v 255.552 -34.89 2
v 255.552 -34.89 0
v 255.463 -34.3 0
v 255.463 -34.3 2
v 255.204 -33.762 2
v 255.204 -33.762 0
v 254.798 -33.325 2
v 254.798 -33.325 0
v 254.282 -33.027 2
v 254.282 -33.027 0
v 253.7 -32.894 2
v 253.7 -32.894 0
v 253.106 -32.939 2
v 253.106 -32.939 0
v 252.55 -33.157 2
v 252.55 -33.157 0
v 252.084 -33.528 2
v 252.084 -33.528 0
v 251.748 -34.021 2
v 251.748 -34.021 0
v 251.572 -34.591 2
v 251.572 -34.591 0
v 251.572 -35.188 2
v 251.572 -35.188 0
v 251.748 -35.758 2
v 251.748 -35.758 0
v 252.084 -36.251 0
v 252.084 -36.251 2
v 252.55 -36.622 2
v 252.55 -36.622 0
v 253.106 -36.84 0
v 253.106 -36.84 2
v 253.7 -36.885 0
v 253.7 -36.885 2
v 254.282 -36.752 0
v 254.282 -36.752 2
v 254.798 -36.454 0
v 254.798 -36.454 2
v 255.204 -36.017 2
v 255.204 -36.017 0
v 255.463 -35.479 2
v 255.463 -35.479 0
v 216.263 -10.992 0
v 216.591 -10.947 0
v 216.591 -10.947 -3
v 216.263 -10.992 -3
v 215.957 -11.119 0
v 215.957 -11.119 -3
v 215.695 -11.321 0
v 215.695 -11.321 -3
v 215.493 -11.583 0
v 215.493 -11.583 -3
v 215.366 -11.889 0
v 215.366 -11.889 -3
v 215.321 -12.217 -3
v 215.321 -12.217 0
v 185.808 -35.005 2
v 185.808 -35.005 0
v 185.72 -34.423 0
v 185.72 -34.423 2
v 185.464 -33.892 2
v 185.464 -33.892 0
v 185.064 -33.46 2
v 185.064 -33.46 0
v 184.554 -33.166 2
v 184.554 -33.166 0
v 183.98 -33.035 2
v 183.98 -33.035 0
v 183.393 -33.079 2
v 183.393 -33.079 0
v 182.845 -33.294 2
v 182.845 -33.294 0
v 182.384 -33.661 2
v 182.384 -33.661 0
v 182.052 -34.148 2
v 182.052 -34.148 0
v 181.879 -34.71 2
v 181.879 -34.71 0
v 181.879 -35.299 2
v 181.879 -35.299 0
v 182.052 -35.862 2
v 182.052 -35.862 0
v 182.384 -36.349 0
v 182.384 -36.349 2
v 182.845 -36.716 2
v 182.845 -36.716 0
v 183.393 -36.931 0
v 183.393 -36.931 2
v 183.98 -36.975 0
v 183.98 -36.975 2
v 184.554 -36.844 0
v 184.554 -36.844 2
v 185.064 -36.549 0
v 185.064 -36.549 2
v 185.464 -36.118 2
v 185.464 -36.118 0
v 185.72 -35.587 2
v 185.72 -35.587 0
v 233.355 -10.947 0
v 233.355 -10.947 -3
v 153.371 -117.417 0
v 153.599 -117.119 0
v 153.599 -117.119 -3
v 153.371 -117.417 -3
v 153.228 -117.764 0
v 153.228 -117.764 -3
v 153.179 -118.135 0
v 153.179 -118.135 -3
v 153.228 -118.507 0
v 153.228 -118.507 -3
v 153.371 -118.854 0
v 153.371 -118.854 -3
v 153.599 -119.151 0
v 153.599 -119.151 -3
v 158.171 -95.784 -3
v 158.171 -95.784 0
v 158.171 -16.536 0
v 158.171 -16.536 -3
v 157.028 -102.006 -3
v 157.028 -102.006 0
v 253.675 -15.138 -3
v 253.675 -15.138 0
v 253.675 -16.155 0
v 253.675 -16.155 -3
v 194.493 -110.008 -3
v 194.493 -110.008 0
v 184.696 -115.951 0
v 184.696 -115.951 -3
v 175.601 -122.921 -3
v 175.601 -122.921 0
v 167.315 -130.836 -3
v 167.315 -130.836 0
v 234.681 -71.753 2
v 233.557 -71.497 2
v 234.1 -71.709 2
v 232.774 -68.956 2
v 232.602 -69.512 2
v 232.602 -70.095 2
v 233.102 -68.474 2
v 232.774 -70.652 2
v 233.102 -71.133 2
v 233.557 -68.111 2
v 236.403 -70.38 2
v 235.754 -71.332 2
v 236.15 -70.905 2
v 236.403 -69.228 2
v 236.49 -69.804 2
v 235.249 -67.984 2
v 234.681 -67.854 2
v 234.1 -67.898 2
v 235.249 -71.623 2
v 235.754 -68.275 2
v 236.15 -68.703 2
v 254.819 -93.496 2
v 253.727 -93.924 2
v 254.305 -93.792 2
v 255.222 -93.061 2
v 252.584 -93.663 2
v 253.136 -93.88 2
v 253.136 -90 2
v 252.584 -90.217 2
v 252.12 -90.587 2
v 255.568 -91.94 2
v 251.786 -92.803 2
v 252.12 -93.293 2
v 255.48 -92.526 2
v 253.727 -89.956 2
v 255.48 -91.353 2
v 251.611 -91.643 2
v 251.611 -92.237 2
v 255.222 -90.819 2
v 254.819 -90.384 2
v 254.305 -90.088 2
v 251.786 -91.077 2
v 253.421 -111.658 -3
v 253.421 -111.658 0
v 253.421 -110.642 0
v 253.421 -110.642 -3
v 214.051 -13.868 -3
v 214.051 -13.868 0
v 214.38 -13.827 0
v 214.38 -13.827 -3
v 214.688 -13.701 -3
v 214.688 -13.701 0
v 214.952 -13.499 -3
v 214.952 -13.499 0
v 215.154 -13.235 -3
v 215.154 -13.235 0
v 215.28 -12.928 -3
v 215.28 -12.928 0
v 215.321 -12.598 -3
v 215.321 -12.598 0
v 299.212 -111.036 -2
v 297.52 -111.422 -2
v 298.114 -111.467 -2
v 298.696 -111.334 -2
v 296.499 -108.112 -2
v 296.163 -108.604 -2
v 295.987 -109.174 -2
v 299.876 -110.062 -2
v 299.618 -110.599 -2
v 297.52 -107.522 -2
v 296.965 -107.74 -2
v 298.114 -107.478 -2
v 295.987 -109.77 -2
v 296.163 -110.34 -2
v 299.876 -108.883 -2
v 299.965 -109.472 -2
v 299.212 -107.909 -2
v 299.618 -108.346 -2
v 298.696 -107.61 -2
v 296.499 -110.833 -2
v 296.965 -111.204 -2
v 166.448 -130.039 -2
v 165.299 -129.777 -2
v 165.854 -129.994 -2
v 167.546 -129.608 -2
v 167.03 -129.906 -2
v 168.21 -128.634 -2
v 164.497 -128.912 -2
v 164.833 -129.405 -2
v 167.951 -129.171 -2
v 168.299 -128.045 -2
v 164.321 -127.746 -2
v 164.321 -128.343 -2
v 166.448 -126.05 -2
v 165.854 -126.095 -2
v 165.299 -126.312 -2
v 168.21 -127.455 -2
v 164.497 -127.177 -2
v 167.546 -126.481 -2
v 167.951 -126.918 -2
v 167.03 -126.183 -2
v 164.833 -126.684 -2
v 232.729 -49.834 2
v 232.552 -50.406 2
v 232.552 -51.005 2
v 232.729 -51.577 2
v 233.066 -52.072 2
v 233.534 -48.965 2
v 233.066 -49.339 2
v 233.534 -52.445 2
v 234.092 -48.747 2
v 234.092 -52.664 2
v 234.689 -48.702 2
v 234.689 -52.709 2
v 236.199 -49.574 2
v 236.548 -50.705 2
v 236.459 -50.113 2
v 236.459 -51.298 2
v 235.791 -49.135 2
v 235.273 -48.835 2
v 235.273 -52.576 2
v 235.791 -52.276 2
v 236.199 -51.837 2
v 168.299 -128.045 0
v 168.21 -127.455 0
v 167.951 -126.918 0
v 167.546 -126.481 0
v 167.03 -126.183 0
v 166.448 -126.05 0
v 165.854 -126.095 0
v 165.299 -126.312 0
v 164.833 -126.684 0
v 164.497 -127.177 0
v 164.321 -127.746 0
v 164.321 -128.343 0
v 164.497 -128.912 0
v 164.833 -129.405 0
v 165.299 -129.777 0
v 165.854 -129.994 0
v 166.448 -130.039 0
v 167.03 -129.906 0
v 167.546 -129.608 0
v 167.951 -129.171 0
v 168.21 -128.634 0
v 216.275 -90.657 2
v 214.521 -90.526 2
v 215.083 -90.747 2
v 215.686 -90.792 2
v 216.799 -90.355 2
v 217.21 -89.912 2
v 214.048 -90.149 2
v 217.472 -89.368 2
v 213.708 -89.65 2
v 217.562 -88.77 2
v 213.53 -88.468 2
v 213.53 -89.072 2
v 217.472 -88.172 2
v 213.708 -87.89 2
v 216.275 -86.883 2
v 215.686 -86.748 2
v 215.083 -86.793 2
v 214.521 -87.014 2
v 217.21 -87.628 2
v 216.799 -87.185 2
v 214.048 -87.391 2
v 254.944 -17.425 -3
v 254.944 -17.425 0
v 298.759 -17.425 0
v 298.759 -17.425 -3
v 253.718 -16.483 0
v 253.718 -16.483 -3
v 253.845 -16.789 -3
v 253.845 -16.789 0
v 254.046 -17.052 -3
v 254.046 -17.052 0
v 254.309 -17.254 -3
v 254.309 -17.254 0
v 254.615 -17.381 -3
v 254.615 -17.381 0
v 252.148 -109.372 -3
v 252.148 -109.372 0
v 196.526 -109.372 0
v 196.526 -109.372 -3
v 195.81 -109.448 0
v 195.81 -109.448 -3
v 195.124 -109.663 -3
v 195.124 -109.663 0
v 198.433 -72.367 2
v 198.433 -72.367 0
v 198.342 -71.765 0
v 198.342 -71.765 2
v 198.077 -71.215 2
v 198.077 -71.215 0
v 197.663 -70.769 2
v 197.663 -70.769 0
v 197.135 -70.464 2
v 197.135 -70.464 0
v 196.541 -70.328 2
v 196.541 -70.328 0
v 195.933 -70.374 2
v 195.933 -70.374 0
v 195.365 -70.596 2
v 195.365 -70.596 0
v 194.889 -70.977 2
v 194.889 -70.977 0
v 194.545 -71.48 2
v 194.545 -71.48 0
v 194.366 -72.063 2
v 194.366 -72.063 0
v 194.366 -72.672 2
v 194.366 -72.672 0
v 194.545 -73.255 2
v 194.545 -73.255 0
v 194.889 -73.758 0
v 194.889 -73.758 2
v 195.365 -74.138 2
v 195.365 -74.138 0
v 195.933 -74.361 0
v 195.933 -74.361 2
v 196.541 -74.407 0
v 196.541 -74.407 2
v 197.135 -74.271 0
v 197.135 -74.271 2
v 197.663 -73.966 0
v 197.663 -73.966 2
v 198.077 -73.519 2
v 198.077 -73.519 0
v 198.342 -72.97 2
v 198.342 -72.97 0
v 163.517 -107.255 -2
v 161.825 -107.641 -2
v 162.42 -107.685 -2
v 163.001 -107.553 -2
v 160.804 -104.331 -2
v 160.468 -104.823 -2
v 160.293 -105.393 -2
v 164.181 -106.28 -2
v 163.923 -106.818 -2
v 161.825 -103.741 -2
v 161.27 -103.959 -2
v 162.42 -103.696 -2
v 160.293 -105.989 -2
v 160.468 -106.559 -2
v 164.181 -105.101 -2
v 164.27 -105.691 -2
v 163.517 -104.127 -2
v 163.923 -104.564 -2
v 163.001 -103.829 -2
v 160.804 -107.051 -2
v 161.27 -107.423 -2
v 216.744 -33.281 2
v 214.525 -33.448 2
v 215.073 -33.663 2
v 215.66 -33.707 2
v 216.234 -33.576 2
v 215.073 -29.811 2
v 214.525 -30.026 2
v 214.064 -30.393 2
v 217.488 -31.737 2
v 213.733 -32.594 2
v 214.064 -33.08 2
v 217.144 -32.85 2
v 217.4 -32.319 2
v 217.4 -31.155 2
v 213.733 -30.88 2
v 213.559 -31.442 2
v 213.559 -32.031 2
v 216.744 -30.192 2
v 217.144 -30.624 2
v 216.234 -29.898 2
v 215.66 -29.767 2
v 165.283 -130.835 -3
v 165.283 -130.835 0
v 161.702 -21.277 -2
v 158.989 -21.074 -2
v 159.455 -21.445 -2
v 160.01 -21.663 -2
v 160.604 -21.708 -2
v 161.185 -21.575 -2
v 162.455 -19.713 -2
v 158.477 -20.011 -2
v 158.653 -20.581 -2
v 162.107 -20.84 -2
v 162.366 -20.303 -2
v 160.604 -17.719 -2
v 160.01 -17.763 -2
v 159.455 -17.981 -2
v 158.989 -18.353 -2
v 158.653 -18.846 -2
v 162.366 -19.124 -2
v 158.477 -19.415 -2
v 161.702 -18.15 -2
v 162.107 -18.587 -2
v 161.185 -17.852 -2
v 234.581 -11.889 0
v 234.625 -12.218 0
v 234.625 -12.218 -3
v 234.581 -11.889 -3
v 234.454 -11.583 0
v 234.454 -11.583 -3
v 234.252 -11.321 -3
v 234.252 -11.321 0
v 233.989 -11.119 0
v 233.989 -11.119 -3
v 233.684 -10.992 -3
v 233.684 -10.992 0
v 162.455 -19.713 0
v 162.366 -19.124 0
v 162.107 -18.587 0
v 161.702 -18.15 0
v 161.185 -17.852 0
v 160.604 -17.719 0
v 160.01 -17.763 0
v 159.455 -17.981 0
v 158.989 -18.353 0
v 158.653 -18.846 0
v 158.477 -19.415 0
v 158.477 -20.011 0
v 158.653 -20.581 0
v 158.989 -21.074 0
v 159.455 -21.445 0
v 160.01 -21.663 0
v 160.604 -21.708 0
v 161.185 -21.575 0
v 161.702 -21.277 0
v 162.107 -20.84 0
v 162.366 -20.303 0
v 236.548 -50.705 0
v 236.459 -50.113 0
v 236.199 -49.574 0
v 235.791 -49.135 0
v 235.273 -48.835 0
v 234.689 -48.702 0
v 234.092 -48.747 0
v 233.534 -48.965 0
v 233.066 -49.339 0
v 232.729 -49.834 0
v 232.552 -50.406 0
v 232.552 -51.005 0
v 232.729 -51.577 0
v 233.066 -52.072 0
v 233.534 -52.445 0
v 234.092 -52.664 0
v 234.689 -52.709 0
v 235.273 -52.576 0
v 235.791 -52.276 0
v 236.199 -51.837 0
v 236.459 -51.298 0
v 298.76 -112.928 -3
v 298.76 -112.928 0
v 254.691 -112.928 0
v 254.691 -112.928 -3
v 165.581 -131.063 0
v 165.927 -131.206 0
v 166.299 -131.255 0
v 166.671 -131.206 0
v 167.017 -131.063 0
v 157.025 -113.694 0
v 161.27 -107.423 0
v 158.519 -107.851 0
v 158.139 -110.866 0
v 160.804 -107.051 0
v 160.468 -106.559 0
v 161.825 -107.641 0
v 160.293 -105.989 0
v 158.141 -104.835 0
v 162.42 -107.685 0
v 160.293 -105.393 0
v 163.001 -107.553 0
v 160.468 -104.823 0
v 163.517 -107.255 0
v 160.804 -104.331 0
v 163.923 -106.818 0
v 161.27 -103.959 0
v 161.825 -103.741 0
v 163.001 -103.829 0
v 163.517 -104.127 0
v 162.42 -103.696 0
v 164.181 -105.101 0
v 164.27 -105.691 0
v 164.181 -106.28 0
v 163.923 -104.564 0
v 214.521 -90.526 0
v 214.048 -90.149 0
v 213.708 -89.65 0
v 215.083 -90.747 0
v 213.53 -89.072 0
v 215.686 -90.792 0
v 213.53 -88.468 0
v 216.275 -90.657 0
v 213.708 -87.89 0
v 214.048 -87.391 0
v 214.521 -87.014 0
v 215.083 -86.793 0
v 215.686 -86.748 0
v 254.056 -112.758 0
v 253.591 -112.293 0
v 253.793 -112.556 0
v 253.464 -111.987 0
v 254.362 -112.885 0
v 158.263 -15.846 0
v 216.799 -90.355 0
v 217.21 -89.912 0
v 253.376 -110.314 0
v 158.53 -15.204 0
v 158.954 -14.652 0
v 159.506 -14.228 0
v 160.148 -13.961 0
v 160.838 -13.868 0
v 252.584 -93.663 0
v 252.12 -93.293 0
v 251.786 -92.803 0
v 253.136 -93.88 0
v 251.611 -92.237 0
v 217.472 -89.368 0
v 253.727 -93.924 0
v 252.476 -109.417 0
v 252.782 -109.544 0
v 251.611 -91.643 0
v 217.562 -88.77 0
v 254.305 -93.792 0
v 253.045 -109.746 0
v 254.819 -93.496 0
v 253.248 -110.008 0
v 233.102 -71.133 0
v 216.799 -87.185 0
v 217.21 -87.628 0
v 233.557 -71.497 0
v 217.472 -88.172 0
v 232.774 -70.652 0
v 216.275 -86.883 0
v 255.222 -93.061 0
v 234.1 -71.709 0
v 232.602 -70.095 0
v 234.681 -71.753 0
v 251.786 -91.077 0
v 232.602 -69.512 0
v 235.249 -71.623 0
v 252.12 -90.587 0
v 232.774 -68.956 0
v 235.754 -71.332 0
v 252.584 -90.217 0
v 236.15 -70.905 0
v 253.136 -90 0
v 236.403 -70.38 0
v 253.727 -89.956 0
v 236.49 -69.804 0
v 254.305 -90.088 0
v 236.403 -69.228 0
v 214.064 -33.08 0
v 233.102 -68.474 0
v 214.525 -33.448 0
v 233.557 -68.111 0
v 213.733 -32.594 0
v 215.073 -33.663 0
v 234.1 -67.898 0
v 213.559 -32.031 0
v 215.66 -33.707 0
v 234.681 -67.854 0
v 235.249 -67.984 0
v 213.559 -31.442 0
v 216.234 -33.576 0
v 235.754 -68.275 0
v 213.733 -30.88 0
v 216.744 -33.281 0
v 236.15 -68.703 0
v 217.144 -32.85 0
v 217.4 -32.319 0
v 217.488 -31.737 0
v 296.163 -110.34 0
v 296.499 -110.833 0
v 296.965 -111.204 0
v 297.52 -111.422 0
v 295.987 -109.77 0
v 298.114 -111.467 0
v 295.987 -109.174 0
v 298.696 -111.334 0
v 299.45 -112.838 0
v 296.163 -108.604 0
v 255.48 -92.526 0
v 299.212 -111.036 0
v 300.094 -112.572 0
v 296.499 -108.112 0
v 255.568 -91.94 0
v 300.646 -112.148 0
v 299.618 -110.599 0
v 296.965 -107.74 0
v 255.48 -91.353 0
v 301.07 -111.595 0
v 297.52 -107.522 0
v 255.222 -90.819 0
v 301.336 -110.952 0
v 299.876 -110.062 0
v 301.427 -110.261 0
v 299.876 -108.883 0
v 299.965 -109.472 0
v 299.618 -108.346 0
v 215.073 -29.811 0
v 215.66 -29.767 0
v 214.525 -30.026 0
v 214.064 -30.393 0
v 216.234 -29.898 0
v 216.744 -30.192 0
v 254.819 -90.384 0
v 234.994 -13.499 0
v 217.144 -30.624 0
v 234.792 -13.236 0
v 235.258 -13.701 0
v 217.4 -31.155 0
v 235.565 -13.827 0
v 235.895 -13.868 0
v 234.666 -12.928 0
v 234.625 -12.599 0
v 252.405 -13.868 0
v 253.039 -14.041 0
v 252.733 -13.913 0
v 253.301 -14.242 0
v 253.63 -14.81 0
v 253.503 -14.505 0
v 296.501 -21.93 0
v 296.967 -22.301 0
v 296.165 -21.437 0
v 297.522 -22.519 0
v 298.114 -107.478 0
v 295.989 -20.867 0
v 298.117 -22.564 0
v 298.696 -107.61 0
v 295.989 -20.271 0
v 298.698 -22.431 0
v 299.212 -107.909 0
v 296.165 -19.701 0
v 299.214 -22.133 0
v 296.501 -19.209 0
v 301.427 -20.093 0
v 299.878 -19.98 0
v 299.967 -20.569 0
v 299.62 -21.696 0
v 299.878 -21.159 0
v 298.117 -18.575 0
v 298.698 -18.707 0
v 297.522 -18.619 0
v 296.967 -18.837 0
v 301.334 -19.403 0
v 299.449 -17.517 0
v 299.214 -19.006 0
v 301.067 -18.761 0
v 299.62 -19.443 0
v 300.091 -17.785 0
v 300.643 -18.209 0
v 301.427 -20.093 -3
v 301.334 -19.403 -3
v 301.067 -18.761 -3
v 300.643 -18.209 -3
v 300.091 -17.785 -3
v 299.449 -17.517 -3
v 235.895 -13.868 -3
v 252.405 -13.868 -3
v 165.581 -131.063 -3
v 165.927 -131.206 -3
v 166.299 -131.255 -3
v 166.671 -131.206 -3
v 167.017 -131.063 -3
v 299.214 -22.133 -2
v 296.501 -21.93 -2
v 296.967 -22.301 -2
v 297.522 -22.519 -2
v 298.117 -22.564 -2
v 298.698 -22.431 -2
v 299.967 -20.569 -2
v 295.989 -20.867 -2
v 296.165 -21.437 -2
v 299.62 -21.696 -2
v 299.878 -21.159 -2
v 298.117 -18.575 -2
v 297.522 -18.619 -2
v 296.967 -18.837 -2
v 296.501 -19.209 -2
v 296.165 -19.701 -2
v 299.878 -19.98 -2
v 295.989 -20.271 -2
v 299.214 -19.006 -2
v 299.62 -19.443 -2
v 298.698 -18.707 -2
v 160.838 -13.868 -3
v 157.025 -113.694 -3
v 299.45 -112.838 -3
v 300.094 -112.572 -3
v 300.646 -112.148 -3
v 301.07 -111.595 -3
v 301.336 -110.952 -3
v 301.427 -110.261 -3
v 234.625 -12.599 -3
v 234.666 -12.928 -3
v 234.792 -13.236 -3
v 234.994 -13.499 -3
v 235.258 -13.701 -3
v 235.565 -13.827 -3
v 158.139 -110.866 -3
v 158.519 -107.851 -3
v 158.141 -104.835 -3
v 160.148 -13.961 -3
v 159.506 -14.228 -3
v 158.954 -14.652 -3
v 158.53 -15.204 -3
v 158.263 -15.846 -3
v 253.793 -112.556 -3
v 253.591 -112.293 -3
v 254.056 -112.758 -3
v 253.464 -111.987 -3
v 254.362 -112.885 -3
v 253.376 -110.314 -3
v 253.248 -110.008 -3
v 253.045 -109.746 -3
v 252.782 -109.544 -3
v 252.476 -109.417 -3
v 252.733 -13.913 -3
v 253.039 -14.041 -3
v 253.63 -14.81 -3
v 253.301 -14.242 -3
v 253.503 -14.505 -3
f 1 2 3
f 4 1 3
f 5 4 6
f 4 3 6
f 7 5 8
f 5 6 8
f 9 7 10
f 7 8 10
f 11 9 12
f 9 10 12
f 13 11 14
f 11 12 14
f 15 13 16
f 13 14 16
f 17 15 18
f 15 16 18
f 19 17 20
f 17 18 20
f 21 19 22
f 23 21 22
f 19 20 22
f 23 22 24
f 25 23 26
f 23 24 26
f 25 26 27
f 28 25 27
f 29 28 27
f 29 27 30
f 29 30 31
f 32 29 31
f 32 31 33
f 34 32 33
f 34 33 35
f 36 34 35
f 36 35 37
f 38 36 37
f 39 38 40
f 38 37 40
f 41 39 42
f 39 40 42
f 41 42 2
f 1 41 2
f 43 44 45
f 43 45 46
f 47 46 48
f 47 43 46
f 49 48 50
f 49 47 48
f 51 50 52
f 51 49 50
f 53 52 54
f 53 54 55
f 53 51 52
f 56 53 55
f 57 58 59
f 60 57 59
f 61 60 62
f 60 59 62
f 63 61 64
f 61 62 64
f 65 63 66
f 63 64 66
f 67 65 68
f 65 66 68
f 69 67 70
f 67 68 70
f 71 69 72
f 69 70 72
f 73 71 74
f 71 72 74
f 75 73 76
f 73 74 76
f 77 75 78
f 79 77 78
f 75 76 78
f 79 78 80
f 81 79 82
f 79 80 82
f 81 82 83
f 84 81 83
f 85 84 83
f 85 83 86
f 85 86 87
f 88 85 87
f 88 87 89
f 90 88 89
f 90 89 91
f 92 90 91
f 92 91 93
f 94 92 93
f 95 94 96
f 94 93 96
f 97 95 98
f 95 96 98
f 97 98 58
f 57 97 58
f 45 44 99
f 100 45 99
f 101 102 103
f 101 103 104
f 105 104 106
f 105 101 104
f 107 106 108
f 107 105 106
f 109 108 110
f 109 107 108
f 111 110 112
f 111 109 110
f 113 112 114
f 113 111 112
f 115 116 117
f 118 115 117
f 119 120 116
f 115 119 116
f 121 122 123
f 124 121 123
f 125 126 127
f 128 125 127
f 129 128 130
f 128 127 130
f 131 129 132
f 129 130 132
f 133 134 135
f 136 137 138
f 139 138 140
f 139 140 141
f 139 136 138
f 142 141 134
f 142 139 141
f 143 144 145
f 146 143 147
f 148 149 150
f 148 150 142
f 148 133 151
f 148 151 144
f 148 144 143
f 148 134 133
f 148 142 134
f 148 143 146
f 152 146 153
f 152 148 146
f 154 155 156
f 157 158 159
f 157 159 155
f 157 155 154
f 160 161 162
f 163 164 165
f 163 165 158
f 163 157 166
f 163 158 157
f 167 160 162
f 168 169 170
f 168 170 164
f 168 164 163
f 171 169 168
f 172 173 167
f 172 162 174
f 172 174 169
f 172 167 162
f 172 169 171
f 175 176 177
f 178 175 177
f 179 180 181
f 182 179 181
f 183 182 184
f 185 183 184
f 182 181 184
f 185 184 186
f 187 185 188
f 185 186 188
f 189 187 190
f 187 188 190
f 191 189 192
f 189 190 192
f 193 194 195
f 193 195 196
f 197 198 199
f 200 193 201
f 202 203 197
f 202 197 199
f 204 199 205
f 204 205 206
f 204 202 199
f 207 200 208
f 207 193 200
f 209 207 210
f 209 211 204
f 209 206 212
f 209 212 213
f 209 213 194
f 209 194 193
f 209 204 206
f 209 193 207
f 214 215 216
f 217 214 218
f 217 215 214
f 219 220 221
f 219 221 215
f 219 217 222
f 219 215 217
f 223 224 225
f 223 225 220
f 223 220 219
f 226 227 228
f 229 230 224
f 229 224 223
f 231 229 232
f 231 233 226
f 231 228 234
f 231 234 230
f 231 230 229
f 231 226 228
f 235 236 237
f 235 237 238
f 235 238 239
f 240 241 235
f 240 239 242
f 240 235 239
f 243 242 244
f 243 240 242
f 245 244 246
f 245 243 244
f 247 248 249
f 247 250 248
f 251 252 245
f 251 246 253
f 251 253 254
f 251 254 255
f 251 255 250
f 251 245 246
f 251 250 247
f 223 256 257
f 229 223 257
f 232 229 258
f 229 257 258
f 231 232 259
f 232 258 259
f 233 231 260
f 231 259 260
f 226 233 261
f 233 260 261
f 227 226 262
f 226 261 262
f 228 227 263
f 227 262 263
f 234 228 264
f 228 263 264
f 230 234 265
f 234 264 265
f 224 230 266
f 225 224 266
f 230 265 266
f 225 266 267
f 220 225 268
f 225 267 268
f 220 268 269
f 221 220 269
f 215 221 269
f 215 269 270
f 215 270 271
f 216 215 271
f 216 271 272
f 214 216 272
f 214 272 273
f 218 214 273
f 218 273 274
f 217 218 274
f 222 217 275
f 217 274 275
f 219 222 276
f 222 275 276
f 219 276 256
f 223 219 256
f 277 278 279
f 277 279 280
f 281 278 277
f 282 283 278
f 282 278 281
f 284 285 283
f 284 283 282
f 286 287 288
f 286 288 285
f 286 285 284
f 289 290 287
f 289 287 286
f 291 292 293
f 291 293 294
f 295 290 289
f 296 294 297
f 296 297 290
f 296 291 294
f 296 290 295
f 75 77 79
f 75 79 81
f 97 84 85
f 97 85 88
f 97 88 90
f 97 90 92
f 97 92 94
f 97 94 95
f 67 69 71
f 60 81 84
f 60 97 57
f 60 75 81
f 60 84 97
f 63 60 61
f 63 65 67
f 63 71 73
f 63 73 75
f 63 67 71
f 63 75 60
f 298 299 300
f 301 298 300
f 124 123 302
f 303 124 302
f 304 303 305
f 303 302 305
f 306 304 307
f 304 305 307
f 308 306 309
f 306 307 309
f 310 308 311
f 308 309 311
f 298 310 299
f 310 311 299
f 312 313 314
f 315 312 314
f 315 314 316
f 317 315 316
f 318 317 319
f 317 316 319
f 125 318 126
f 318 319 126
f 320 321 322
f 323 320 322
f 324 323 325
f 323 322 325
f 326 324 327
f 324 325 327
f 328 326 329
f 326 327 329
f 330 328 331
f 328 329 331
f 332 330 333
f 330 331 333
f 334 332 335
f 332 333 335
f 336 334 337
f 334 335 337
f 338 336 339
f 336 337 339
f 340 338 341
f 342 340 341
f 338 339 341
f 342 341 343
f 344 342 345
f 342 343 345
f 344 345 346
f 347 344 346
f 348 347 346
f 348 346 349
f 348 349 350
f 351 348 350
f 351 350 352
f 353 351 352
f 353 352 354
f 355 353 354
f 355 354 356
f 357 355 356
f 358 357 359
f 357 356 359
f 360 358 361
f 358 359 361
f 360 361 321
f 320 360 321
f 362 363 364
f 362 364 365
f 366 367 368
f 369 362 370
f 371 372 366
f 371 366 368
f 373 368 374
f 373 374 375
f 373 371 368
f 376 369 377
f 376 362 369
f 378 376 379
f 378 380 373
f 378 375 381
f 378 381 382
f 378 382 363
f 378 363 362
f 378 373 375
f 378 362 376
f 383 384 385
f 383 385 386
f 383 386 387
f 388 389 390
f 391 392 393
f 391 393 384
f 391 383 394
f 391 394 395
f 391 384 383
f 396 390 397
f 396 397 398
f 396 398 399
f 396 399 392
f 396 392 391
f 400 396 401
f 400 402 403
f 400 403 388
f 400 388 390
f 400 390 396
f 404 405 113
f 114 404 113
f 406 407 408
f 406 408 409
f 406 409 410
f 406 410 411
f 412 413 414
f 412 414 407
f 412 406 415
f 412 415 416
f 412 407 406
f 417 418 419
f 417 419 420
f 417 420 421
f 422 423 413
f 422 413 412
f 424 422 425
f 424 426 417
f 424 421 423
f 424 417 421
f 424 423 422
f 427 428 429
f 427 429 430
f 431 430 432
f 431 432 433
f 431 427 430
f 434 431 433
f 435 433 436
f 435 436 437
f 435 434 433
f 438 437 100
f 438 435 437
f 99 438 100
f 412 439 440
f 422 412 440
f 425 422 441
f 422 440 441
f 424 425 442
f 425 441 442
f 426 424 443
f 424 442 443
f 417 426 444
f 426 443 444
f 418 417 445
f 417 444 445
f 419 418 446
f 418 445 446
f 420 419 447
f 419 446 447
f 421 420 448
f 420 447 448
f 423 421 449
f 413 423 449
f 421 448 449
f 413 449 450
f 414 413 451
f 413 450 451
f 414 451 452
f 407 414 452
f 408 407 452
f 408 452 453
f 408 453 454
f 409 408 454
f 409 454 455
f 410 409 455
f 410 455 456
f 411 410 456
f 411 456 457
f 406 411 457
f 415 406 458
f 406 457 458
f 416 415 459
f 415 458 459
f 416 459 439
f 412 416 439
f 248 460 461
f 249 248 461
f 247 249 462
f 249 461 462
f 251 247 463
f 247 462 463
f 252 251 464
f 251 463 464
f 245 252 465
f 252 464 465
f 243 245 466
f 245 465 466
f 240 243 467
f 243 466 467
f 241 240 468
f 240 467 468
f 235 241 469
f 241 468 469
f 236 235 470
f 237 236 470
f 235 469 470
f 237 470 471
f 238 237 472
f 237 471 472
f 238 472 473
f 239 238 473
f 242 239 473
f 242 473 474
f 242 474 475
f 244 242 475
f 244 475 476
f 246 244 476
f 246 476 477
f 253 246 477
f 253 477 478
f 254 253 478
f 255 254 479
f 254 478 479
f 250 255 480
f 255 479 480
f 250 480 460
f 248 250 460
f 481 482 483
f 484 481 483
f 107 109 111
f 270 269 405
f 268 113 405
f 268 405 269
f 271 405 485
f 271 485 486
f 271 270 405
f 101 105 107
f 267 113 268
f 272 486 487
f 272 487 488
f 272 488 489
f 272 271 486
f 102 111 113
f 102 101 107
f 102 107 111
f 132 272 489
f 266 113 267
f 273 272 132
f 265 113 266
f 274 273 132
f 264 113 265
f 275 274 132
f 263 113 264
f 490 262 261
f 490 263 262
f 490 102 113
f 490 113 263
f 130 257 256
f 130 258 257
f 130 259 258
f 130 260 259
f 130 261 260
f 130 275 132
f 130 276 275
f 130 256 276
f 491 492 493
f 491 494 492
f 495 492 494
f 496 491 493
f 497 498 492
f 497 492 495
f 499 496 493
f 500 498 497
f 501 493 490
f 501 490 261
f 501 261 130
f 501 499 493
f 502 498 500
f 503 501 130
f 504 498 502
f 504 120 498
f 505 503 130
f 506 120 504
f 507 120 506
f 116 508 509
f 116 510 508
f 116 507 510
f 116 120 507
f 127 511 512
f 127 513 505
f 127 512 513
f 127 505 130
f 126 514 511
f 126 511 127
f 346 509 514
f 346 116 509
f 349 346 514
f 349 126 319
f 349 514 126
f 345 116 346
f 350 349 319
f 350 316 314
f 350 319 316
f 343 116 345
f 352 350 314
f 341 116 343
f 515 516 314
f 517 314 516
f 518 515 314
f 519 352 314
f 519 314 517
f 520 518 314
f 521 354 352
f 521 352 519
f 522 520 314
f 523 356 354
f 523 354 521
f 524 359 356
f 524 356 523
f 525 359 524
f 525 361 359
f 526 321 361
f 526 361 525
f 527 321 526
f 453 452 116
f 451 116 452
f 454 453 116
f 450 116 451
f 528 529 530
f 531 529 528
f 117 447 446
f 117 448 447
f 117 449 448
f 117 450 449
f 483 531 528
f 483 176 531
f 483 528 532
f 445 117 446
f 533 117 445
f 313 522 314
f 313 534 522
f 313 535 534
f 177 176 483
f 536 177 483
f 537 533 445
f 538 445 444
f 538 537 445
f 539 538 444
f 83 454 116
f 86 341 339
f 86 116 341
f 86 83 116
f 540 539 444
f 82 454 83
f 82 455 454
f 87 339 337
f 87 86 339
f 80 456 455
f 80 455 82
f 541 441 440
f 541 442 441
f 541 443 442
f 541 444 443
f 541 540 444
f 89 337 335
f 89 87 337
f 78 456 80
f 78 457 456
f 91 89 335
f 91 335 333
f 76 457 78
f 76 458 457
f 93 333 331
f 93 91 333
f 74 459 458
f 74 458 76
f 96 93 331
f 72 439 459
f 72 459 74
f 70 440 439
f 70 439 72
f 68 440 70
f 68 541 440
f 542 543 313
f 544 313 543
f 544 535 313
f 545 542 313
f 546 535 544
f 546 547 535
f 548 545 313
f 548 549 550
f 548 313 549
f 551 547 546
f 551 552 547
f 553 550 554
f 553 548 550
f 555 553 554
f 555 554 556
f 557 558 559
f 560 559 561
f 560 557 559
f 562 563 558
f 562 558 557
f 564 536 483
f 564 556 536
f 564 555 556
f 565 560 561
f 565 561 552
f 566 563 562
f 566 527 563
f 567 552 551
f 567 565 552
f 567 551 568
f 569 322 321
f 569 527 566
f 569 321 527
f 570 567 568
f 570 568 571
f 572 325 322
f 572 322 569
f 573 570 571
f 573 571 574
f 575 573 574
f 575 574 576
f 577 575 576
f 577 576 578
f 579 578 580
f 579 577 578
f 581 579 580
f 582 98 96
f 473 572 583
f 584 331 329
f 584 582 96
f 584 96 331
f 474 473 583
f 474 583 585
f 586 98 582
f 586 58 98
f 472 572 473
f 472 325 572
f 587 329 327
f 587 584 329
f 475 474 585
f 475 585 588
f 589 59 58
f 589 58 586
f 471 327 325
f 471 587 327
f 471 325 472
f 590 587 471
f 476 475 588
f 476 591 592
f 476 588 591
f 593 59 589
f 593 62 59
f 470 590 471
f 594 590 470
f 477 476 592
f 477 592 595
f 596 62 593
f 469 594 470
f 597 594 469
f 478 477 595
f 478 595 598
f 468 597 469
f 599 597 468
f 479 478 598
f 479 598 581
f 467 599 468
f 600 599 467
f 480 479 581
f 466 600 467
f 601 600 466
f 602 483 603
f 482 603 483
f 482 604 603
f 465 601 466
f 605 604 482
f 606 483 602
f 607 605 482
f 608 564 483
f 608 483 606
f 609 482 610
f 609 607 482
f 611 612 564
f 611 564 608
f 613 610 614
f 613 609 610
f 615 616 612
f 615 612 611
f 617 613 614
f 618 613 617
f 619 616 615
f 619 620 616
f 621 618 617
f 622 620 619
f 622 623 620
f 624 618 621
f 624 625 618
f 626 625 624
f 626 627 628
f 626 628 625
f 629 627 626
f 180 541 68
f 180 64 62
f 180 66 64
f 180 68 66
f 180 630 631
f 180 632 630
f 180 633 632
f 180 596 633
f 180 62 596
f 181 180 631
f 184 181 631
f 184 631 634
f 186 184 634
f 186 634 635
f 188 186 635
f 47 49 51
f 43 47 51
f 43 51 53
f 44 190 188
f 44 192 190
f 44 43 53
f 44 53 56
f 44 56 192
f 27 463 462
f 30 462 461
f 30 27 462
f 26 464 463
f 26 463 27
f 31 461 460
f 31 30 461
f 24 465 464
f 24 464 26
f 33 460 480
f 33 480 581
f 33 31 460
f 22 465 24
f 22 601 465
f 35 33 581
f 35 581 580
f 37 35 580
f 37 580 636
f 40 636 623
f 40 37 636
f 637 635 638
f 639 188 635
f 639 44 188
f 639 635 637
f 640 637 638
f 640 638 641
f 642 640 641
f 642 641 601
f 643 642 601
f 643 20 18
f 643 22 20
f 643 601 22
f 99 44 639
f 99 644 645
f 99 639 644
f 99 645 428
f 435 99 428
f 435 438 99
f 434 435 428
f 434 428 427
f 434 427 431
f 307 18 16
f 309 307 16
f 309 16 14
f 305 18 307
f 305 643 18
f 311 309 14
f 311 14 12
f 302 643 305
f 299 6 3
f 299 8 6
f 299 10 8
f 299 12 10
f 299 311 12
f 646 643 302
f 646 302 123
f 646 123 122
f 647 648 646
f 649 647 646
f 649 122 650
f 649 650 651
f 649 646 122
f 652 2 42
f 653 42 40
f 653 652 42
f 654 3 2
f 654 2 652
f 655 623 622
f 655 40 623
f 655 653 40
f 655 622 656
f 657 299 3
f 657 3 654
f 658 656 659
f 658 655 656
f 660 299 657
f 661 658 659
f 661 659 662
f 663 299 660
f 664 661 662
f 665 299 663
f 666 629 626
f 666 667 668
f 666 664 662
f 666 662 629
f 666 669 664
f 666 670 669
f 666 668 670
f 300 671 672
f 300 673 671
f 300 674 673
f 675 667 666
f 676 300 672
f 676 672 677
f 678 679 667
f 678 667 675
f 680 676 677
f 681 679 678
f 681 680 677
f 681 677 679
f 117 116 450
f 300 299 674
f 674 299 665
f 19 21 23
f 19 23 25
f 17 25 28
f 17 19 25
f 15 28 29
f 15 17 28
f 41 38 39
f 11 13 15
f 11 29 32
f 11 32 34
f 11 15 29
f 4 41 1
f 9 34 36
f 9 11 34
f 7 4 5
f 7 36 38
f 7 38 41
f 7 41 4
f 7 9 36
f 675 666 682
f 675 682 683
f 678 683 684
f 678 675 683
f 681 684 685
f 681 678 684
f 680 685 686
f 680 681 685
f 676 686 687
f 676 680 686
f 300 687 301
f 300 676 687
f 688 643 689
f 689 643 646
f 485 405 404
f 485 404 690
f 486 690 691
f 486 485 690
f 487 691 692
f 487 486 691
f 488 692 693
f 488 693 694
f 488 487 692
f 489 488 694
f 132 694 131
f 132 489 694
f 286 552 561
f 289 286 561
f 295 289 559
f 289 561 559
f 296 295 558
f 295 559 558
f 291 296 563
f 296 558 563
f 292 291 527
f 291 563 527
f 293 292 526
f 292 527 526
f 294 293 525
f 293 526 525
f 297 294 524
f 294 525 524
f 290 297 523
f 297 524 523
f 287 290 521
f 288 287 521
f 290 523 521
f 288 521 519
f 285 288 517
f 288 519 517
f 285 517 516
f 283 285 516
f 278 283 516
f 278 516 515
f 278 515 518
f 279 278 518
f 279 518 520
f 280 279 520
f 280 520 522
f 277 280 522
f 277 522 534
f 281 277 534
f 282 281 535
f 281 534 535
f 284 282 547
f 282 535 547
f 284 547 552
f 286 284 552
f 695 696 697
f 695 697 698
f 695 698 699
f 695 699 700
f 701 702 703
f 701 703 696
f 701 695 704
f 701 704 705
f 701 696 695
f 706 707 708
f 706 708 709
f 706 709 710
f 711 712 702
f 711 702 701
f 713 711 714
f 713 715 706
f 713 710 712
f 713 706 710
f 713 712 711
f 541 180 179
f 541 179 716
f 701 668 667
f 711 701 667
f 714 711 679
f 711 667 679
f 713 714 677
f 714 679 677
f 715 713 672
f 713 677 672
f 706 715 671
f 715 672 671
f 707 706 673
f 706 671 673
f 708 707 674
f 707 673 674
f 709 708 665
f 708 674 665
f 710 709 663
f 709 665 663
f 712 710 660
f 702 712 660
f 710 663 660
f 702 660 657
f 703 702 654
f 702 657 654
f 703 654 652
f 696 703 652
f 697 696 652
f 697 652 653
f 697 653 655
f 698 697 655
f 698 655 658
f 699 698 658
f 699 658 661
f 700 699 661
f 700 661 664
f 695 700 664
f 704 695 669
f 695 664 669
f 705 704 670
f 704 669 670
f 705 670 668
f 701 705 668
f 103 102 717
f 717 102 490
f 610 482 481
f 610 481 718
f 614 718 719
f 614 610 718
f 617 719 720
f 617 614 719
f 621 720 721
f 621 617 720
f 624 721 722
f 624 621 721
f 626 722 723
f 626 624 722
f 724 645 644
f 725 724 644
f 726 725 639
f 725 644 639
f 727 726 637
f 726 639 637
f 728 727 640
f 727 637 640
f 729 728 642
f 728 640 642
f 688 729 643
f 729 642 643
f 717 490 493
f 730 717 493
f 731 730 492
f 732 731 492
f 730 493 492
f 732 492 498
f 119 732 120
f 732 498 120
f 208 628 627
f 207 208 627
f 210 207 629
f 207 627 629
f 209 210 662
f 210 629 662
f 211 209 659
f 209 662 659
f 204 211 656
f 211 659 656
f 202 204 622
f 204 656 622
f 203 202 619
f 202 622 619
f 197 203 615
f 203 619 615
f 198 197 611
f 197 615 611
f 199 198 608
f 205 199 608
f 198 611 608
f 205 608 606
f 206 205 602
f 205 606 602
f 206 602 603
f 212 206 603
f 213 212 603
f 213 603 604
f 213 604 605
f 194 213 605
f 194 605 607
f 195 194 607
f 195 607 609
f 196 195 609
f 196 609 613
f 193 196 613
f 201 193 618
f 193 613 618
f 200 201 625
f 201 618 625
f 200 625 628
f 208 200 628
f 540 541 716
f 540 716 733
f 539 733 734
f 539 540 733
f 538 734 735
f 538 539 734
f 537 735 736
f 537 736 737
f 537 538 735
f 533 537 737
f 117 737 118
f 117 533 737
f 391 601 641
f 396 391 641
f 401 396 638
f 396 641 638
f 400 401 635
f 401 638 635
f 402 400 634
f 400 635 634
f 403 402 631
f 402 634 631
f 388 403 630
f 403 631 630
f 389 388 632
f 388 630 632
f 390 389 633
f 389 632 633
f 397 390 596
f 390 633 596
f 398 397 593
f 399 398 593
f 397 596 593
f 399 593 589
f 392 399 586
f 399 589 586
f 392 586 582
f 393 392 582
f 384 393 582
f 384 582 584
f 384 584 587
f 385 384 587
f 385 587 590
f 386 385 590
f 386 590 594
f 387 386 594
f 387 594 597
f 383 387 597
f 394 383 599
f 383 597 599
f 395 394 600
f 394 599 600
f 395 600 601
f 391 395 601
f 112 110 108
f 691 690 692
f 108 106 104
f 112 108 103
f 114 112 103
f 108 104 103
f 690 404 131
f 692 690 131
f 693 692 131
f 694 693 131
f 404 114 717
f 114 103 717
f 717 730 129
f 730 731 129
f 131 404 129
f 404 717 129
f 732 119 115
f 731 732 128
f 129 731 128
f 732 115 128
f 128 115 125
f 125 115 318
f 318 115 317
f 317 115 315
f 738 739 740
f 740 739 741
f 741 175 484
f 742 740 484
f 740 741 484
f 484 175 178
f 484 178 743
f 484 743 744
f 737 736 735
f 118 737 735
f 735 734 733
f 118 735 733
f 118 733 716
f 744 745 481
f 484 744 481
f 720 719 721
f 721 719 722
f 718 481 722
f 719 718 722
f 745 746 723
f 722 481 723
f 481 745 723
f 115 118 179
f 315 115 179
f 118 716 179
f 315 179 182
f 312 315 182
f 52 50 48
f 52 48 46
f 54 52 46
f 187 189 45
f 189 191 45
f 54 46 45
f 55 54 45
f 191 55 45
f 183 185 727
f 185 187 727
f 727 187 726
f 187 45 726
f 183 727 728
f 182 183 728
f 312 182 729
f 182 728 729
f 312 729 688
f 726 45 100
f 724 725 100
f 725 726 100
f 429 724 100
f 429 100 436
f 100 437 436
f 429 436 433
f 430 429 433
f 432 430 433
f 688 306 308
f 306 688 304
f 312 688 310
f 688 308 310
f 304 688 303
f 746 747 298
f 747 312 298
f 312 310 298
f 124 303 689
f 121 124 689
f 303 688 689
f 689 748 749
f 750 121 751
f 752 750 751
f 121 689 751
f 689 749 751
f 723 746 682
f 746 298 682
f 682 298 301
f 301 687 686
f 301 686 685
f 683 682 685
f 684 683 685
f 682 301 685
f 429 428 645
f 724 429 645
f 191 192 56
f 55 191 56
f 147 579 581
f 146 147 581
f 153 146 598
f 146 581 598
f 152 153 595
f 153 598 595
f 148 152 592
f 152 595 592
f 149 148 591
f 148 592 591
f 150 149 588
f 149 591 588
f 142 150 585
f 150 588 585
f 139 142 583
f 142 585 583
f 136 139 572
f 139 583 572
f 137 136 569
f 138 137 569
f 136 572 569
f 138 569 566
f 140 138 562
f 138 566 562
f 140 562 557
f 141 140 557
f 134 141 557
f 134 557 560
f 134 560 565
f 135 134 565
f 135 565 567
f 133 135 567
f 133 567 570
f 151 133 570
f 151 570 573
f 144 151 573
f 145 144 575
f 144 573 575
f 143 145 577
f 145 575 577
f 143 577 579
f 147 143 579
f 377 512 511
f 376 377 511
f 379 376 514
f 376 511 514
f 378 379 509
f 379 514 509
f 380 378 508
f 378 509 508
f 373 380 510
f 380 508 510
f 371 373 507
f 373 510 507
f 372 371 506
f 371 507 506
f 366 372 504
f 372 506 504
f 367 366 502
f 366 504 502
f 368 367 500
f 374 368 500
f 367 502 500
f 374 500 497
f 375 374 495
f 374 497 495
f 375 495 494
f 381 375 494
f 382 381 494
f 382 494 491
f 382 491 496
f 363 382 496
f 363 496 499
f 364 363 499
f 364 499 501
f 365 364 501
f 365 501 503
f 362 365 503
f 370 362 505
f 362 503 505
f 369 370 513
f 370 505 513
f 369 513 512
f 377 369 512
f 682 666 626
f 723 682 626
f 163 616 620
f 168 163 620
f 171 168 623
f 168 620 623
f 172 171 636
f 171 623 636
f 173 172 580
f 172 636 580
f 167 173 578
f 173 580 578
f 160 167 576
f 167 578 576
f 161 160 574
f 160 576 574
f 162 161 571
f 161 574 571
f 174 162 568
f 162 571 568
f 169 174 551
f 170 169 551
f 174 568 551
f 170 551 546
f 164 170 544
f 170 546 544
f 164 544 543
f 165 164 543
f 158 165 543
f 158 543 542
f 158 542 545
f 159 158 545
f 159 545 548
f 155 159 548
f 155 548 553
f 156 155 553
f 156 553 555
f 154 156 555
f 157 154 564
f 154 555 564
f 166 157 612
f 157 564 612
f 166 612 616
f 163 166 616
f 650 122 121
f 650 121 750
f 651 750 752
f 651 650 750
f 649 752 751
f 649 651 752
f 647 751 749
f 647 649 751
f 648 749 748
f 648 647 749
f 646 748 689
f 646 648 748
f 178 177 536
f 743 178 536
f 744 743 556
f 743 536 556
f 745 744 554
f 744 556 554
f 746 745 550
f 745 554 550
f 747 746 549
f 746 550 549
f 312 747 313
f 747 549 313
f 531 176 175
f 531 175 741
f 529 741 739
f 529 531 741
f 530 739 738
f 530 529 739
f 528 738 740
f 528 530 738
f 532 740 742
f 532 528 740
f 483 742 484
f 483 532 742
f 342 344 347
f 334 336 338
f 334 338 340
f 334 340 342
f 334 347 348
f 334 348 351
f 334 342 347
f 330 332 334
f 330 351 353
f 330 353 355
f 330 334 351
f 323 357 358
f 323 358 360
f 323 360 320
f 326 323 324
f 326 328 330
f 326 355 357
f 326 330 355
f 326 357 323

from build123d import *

# Parameters (mm, degrees)
PAD001_DEPTH  = 3
SKETCH014_R   = 2.000997
SKETCH014_R_2 = 1.989716
SKETCH014_R_3 = 2.044982
SKETCH014_R_4 = 1.975414
SKETCH014_R_5 = 2.027461
SKETCH014_R_6 = 1.954742
SKETCH014_R_7 = 2.009119
PAD013_DEPTH  = 2
SKETCH015_R   = 2
POCKET_DEPTH  = 2


with BuildPart() as part:
    # Sketch002 → Pad001 (new body)
    with BuildSketch(Plane.XY):
        with BuildLine():
            Line((158.170695, -17.490656), (158.170695, -16.535702))
            ThreePointArc((160.837743, -13.868068), (158.954121, -14.651909), (158.170695, -16.535702))
            Line((161.975632, -13.868068), (160.837743, -13.868068))
            Line((161.975632, -13.868068), (214.050903, -13.868068))
            ThreePointArc((214.050903, -13.868068), (214.951659, -13.498902), (215.320954, -12.598198))
            Line((215.320954, -12.598198), (215.320954, -12.216596))
            ThreePointArc((216.59103, -10.947382), (215.694908, -11.320728), (215.320954, -12.216596))
            Line((216.59103, -10.947382), (218.273682, -10.947382))
            Line((218.273682, -10.947382), (233.355242, -10.947382))
            ThreePointArc((234.625102, -12.21752), (234.252072, -11.320608), (233.355242, -10.947382))
            Line((234.625102, -12.21752), (234.625102, -12.598559))
            ThreePointArc((234.625102, -12.598559), (234.994142, -13.499389), (235.895, -13.868359))
            Line((235.895, -13.868359), (238.271805, -13.868359))
            Line((238.271805, -13.868359), (252.40531, -13.868359))
            ThreePointArc((253.674886, -15.138264), (253.301131, -14.242347), (252.40531, -13.868359))
            Line((253.674886, -15.138264), (253.674886, -16.154515))
            ThreePointArc((253.674886, -16.154515), (254.046325, -17.05216), (254.943533, -17.424653))
            Line((254.943533, -17.424653), (298.758985, -17.424653))
            ThreePointArc((301.426813, -20.093175), (300.642993, -18.208962), (298.758985, -17.424653))
            Line((301.426813, -20.093175), (301.426813, -110.261392))
            ThreePointArc((298.759763, -112.928087), (300.646389, -112.147914), (301.426813, -110.261392))
            Line((298.759763, -112.928087), (296.766937, -112.928087))
            Line((296.766937, -112.928087), (254.690998, -112.928087))
            ThreePointArc((253.420935, -111.658351), (253.793197, -112.556056), (254.690998, -112.928087))
            Line((253.420935, -111.658351), (253.420935, -110.642303))
            ThreePointArc((253.420935, -110.642303), (253.045275, -109.745808), (252.147799, -109.372497))
            Line((252.147799, -109.372497), (196.525526, -109.372497))
            ThreePointArc((196.525526, -109.372497), (195.461836, -109.538225), (194.493223, -110.008001))
            ThreePointArc((194.493223, -110.008001), (180.053907, -119.312238), (167.31519, -130.835593))
            ThreePointArc((165.282705, -130.835445), (166.298917, -131.255159), (167.31519, -130.835593))
            Line((165.282705, -130.835445), (153.598862, -119.151413))
            ThreePointArc((153.598907, -117.119461), (153.178634, -118.135428), (153.598862, -119.151413))
            Line((153.598907, -117.119461), (157.024855, -113.694223))
            ThreePointArc((157.024855, -113.694223), (158.518785, -107.850658), (157.027893, -102.006317))
            Line((157.027893, -102.006317), (158.170695, -95.78363))
            Line((158.170695, -95.78363), (158.170695, -17.490656))
        make_face()
    extrude(amount=-PAD001_DEPTH)

    # Sketch014 → Pad013 (join)
    with BuildSketch(Plane.XY):
        with Locations((253.550873, -34.889503)):
            Circle(SKETCH014_R)
        with Locations((253.5784, -91.939972)):
            Circle(SKETCH014_R_2)
        with Locations((196.387711, -72.36747)):
            Circle(SKETCH014_R_3)
        with Locations((215.512299, -31.736803)):
            Circle(SKETCH014_R_4)
        with Locations((215.534556, -88.769968)):
            Circle(SKETCH014_R_5)
        with Locations((234.534821, -69.803696)):
            Circle(SKETCH014_R_6)
        with Locations((234.538681, -50.705391)):
            Circle(SKETCH014_R_7)
        with Locations((183.832245, -35.004906)):
            Circle(SKETCH014_R_4)
    extrude(amount=PAD013_DEPTH)

    # Sketch015 (on Face37 of Pad001) → Pocket (cut)
    with BuildSketch(Plane.XY):
        with Locations((166.298927, -128.044507)):
            Circle(SKETCH015_R)
        with Locations((297.965025, -109.472203)):
            Circle(SKETCH015_R)
        with Locations((160.45478, -19.71329)):
            Circle(SKETCH015_R)
        with Locations((297.96712, -20.569173)):
            Circle(SKETCH015_R)
        with Locations((162.270263, -105.690893)):
            Circle(SKETCH015_R)
    extrude(amount=-POCKET_DEPTH, mode=Mode.SUBTRACT)


solid = part.part
